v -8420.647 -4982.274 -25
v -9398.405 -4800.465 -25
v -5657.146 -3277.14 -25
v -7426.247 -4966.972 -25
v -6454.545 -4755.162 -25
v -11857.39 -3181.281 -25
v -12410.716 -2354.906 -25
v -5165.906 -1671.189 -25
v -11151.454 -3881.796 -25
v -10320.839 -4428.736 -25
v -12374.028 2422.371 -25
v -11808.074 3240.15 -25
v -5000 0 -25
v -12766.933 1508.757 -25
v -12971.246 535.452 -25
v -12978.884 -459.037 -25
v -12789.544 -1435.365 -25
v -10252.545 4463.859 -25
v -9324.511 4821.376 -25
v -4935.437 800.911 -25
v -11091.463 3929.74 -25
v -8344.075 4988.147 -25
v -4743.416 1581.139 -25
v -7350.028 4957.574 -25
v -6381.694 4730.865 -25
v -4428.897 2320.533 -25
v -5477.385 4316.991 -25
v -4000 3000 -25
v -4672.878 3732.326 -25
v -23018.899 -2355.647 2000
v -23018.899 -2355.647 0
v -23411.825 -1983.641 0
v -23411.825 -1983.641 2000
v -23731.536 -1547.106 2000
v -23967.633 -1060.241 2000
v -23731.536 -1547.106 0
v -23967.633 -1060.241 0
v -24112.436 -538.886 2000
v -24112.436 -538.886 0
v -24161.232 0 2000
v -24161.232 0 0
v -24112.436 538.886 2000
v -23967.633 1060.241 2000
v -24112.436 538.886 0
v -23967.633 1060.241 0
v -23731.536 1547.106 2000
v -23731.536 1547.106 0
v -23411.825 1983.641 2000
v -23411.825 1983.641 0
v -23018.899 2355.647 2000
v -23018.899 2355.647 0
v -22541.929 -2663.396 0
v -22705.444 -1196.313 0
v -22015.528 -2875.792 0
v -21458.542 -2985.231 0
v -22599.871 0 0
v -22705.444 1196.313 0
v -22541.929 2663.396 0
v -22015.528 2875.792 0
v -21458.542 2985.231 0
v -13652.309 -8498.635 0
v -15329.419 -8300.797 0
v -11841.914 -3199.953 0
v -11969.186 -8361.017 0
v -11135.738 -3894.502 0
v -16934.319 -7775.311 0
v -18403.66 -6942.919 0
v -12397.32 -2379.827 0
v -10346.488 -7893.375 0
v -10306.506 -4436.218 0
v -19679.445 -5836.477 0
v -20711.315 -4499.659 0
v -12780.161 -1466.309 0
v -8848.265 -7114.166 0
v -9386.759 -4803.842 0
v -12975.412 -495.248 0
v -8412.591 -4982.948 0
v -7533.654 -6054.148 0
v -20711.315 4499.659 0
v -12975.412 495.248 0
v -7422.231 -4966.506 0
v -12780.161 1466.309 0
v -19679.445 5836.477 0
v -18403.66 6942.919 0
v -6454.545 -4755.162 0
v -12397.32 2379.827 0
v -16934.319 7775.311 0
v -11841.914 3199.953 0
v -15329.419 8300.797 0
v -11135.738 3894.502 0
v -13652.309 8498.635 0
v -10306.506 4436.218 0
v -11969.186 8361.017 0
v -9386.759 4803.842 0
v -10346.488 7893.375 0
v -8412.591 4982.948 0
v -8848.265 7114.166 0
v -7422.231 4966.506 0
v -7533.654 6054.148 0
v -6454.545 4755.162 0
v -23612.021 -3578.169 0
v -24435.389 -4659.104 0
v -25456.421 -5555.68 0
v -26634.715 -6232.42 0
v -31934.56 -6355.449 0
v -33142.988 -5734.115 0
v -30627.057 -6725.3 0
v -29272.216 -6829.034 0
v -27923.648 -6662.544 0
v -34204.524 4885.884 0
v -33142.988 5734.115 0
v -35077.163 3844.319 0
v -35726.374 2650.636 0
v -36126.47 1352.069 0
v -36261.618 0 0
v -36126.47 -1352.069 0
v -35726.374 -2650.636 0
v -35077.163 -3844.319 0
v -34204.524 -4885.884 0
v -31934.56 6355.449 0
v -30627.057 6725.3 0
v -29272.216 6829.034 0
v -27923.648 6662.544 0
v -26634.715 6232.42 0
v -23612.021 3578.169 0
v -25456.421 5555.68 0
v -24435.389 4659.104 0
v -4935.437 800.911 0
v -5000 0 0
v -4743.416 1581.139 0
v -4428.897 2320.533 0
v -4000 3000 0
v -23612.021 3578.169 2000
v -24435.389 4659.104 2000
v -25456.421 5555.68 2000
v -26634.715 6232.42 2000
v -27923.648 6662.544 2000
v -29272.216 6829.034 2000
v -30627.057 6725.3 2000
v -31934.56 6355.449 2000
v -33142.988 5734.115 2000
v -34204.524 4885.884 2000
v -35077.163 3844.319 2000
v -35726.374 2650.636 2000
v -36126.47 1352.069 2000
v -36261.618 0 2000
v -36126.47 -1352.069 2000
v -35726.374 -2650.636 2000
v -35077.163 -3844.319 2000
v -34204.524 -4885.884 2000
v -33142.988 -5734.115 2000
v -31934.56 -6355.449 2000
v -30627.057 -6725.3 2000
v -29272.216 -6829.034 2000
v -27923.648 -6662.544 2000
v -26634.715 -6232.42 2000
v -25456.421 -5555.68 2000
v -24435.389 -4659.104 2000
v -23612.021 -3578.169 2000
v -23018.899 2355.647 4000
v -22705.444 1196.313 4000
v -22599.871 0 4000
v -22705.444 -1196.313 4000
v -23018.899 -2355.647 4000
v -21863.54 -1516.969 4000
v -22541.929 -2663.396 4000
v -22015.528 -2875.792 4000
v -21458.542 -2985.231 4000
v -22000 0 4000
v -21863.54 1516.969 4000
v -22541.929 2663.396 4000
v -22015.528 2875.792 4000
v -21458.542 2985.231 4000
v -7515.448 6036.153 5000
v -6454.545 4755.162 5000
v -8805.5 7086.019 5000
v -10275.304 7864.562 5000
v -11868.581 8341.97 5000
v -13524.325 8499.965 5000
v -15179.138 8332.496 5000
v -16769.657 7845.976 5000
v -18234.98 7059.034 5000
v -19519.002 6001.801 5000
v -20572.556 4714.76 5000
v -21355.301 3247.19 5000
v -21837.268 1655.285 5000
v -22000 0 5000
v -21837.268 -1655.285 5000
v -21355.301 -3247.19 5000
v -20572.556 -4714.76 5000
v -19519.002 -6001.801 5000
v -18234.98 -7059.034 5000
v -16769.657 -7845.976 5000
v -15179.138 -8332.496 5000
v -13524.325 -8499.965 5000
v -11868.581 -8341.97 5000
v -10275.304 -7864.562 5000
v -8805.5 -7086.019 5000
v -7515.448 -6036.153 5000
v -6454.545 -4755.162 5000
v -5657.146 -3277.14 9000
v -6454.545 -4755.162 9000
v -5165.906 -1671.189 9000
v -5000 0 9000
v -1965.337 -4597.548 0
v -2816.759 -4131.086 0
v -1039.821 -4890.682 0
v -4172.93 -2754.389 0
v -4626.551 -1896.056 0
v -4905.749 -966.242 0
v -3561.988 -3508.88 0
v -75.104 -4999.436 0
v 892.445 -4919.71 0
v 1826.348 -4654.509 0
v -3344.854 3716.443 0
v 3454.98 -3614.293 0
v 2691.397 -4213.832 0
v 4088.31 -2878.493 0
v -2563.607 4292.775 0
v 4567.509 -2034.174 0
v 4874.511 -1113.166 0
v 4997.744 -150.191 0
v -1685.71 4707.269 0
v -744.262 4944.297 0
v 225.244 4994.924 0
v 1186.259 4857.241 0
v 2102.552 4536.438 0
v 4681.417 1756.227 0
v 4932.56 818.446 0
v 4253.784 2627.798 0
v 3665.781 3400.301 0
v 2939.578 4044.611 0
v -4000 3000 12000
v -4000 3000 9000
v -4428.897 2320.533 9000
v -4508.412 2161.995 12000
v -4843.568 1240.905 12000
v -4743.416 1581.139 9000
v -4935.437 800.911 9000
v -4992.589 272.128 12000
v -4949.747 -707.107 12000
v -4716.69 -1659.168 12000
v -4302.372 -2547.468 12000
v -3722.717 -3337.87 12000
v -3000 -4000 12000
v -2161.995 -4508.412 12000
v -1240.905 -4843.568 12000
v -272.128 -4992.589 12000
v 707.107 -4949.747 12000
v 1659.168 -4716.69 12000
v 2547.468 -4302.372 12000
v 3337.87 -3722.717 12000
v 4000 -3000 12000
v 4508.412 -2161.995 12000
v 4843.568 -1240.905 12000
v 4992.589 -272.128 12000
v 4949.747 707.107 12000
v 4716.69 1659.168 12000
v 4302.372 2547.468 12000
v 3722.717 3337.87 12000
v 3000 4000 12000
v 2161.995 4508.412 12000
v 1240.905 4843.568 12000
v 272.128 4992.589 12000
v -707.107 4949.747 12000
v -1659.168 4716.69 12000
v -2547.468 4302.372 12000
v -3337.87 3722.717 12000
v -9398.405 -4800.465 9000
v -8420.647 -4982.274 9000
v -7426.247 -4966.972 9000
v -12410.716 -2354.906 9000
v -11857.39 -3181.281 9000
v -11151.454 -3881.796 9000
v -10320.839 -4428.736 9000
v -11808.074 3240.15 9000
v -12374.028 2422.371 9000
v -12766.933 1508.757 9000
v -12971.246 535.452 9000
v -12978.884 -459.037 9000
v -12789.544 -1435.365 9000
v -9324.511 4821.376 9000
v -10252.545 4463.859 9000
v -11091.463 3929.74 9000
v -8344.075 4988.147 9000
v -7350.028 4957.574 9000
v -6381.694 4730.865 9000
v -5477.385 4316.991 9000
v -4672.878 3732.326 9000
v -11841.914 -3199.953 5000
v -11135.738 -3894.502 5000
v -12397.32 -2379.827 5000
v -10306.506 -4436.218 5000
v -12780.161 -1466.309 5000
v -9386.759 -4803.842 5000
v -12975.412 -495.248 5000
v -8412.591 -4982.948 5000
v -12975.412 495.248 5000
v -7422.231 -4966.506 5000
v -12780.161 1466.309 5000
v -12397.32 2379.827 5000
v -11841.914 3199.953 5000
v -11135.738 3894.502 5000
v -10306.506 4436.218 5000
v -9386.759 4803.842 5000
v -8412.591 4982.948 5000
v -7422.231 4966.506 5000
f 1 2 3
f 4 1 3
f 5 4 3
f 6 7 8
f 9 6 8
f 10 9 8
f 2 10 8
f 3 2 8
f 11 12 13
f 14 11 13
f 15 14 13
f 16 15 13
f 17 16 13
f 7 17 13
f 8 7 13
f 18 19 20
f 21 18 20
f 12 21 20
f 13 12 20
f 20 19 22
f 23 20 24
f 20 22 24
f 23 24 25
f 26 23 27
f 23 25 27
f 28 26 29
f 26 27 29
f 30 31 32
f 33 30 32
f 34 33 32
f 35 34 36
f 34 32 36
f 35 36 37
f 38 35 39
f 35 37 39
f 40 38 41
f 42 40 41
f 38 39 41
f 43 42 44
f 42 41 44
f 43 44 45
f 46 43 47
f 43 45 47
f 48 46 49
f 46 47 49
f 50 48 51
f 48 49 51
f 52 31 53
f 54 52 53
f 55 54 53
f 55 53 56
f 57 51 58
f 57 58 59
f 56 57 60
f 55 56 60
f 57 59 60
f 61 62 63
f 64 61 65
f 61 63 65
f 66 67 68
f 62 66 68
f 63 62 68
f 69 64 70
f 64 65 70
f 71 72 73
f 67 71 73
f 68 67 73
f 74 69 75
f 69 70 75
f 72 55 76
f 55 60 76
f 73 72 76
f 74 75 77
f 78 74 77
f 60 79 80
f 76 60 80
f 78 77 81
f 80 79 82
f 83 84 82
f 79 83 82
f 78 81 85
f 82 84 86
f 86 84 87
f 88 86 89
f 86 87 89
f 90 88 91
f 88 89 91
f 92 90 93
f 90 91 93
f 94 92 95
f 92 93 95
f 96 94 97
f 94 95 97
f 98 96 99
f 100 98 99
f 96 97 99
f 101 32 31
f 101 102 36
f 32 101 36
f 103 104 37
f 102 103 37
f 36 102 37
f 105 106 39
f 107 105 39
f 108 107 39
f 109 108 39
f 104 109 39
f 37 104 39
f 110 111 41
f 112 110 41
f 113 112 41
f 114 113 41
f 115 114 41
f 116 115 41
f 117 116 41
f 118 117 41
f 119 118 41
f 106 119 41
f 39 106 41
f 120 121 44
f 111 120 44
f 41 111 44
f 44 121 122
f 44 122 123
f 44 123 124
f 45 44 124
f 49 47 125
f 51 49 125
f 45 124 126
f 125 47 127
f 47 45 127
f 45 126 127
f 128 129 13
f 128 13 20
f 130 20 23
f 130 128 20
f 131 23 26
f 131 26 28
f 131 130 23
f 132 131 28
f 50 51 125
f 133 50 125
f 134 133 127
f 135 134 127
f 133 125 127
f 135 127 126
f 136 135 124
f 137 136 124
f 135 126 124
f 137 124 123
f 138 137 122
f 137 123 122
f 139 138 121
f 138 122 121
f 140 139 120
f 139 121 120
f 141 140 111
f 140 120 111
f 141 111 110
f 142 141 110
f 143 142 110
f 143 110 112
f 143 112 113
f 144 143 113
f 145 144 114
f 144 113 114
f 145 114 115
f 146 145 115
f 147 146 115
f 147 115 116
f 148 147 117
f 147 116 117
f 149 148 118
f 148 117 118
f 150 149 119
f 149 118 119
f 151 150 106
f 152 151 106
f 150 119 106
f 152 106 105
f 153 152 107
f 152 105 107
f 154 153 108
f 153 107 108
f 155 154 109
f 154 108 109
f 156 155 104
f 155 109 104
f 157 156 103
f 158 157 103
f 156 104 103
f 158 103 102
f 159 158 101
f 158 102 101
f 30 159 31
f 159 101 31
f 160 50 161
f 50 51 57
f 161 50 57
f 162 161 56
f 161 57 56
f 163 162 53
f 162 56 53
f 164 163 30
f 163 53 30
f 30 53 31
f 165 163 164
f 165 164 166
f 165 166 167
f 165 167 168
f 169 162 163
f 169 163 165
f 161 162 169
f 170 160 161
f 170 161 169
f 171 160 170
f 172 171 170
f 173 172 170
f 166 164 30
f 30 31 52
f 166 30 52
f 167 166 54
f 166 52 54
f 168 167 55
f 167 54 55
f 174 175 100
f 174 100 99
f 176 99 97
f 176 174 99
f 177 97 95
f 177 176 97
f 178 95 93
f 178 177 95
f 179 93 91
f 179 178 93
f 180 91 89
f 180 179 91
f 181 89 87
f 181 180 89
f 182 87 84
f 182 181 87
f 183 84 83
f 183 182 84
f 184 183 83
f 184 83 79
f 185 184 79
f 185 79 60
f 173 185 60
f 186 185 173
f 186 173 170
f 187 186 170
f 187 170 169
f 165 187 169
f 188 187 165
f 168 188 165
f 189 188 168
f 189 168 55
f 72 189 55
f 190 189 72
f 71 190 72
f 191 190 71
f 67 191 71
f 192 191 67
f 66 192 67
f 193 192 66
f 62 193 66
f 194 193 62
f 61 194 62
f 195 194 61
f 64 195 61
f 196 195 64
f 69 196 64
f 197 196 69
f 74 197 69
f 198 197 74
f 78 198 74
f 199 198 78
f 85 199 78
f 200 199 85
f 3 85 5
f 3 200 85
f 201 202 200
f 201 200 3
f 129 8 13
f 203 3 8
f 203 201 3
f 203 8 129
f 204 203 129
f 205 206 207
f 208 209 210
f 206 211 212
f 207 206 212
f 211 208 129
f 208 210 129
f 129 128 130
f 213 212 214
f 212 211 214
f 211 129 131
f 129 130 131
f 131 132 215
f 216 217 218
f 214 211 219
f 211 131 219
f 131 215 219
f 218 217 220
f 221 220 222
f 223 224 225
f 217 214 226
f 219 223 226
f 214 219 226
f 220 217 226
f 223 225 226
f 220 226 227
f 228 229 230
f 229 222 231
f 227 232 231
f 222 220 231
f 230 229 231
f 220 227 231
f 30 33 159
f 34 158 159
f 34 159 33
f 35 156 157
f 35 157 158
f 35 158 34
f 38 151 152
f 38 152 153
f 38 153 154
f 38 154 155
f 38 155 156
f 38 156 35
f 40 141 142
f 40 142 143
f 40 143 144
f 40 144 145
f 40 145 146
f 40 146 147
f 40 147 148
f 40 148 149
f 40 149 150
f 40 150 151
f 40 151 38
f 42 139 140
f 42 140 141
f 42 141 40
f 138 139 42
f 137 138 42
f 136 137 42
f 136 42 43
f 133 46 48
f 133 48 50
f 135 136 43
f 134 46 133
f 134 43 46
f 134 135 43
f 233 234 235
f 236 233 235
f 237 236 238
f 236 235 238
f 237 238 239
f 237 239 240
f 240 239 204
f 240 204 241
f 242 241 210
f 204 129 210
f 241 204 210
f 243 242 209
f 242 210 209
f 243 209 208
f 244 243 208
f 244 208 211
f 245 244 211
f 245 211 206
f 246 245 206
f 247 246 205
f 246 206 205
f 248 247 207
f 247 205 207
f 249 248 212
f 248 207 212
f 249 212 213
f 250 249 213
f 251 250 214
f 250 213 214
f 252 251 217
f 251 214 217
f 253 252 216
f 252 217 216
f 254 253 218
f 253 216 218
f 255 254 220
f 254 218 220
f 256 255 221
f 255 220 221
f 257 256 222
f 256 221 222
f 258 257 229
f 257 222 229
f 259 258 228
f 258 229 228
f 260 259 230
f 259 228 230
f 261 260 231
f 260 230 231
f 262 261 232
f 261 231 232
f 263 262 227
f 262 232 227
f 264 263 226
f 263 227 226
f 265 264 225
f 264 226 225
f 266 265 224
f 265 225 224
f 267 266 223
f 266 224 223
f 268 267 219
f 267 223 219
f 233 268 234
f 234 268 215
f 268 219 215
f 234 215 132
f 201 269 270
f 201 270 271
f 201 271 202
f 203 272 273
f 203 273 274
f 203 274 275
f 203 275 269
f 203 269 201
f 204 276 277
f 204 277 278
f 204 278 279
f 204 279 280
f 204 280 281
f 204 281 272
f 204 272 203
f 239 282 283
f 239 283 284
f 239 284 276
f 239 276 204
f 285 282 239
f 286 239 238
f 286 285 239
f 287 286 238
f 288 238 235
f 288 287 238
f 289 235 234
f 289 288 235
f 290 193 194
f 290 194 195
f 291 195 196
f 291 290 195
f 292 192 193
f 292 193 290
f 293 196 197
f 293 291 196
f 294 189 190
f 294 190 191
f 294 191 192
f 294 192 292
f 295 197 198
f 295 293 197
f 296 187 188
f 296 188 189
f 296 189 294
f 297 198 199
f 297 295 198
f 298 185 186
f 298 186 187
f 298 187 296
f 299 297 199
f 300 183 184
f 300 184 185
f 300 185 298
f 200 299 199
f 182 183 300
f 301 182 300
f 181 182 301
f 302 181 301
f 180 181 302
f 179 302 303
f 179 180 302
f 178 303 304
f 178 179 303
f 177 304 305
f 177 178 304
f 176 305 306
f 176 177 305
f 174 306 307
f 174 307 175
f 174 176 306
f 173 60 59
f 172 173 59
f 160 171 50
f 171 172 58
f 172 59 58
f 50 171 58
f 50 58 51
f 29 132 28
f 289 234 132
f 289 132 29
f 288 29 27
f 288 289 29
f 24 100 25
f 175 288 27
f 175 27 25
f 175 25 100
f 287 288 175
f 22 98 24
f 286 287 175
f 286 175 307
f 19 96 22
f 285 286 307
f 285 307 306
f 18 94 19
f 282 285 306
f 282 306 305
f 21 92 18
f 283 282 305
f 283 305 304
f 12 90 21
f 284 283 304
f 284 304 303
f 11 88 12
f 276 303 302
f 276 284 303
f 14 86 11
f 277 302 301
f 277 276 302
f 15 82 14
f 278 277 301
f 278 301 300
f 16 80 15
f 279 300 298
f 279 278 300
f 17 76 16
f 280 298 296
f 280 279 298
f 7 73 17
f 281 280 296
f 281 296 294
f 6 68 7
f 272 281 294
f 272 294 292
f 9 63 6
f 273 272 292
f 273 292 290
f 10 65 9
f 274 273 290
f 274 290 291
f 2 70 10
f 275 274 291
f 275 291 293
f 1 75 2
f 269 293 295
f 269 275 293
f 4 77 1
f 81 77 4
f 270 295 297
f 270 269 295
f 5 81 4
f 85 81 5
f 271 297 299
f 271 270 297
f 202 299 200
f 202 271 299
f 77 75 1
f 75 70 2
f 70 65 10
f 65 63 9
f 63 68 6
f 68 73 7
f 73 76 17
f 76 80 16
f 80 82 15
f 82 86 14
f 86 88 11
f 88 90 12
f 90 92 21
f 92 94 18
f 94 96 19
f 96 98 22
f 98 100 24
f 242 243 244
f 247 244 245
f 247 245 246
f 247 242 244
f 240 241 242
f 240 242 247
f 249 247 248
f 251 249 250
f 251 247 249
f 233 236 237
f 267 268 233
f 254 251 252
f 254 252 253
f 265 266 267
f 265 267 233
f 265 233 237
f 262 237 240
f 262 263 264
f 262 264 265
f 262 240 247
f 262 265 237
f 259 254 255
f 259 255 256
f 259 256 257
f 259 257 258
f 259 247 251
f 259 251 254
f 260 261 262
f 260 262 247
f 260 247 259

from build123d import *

# Parameters (mm, degrees)
F1_DEPTH      = 12000
F2_DEPTH      = 9000
F2_DEPTH_BACK = 25
F3_DEPTH      = 5000
F4_DEPTH      = 4000
F5_DEPTH      = 2000


# Not quite as in the source:
# - a feature names something its author has since deleted; it is built from what else it names


with BuildPart() as f1:
    # F0 (on Top) → F1 (new body)
    with BuildSketch(Plane.XY):
        with BuildLine():
            ThreePointArc((-4000, -3000), (1581.1388300842, -4743.4164902526), (5000, 0))
            ThreePointArc((5000, 0), (1581.1388300842, 4743.4164902526), (-4000, 3000))
            ThreePointArc((-4000, 3000), (-3256.5835097474, 1581.1388300842), (-3000, 0))
            ThreePointArc((-3000, 0), (-3256.5835097474, -1581.1388300842), (-4000, -3000))
        make_face()
        with BuildLine():
            ThreePointArc((-3000, 0), (-3256.5835097474, 1581.1388300842), (-4000, 3000))
            ThreePointArc((-4000, 3000), (-4743.4164902526, 1581.1388300842), (-5000, 0))
            ThreePointArc((-5000, 0), (-4743.4164902526, -1581.1388300842), (-4000, -3000))
            ThreePointArc((-4000, -3000), (-3256.5835097474, -1581.1388300842), (-3000, 0))
        make_face()
    extrude(amount=F1_DEPTH)

    # F0 (on Top) → F2 (join, two sides)
    with BuildSketch(Plane.XY) as f2_sk:
        with BuildLine():
            ThreePointArc((-5000, 0), (-4743.4164902526, 1581.1388300842), (-4000, 3000))
            ThreePointArc((-4000, 3000), (-5091.7074828837, 4067.1654299875), (-6454.5454545455, 4755.1624838626))
            ThreePointArc((-6454.5454545455, 4755.1624838626), (-5371.7663777312, 2486.3262420323), (-5000, 0))
        make_face()
        with BuildLine():
            ThreePointArc((-6454.5454545455, -4755.1624838626), (-5371.7663777312, -2486.3262420323), (-5000, 0))
            ThreePointArc((-5000, 0), (-5371.7663777312, 2486.3262420323), (-6454.5454545455, 4755.1624838626))
            ThreePointArc((-6454.5454545455, 4755.1624838626), (-13000, 0), (-6454.5454545456, -4755.1624838626))
        make_face()
    extrude(amount=F2_DEPTH)
    extrude(f2_sk.sketch, amount=-F2_DEPTH_BACK)

    # F0 (on Top) → F3 (join)
    with BuildSketch(Plane.XY):
        with BuildLine():
            ThreePointArc((-18161.2319946289, 0), (-19147.7686227754, 2223.9526186959), (-21458.5421614318, 2985.2314256546))
            ThreePointArc((-21458.5421614317, 2985.2314256544), (-22000, 0), (-21458.5421614317, -2985.2314256544))
            ThreePointArc((-21458.5421614318, -2985.2314256546), (-19147.7686227754, -2223.9526186959), (-18161.2319946289, 0))
        make_face()
        with BuildLine():
            ThreePointArc((-6454.5454545456, -4755.1624838626), (-13000, 0), (-6454.5454545455, 4755.1624838626))
            ThreePointArc((-6454.5454545455, 4755.1624838626), (-14495.7892529623, 8441.4692893882), (-21458.5421614317, 2985.2314256544))
            ThreePointArc((-21458.5421614318, 2985.2314256546), (-19147.7686227754, 2223.9526186959), (-18161.2319946289, 0))
            ThreePointArc((-18161.2319946289, 0), (-19147.7686227754, -2223.9526186959), (-21458.5421614318, -2985.2314256546))
            ThreePointArc((-21458.5421614317, -2985.2314256544), (-14495.7892529623, -8441.4692893882), (-6454.5454545455, -4755.1624838626))
        make_face()
    extrude(amount=F3_DEPTH)

    # F0 (on Top) → F4 (join)
    with BuildSketch(Plane.XY):
        with BuildLine():
            ThreePointArc((-21458.5421614317, -2985.2314256544), (-22000, 0), (-21458.5421614317, 2985.2314256544))
            ThreePointArc((-21458.5421614318, 2985.2314256546), (-22283.7629869561, 2782.0719205773), (-23018.8990545433, 2355.6470649291))
            ThreePointArc((-23018.8990545434, 2355.6470649291), (-22705.4436981203, 1196.3128526148), (-22599.8708086972, 0))
            ThreePointArc((-22599.8708086972, 0), (-22705.4436981203, -1196.3128526148), (-23018.8990545434, -2355.6470649291))
            ThreePointArc((-23018.8990545433, -2355.6470649291), (-22283.7629869561, -2782.0719205773), (-21458.5421614318, -2985.2314256546))
        make_face()
    extrude(amount=F4_DEPTH)

    # F0 (on Top) → F5 (join)
    with BuildSketch(Plane.XY):
        with BuildLine():
            ThreePointArc((-23018.8990545433, -2355.6470649291), (-24161.2319946289, 0), (-23018.8990545433, 2355.6470649291))
            ThreePointArc((-23018.8990545434, 2355.6470649291), (-36261.6175335879, 0), (-23018.8990545434, -2355.6470649291))
        make_face()
    extrude(amount=F5_DEPTH)


solid = f1.part
